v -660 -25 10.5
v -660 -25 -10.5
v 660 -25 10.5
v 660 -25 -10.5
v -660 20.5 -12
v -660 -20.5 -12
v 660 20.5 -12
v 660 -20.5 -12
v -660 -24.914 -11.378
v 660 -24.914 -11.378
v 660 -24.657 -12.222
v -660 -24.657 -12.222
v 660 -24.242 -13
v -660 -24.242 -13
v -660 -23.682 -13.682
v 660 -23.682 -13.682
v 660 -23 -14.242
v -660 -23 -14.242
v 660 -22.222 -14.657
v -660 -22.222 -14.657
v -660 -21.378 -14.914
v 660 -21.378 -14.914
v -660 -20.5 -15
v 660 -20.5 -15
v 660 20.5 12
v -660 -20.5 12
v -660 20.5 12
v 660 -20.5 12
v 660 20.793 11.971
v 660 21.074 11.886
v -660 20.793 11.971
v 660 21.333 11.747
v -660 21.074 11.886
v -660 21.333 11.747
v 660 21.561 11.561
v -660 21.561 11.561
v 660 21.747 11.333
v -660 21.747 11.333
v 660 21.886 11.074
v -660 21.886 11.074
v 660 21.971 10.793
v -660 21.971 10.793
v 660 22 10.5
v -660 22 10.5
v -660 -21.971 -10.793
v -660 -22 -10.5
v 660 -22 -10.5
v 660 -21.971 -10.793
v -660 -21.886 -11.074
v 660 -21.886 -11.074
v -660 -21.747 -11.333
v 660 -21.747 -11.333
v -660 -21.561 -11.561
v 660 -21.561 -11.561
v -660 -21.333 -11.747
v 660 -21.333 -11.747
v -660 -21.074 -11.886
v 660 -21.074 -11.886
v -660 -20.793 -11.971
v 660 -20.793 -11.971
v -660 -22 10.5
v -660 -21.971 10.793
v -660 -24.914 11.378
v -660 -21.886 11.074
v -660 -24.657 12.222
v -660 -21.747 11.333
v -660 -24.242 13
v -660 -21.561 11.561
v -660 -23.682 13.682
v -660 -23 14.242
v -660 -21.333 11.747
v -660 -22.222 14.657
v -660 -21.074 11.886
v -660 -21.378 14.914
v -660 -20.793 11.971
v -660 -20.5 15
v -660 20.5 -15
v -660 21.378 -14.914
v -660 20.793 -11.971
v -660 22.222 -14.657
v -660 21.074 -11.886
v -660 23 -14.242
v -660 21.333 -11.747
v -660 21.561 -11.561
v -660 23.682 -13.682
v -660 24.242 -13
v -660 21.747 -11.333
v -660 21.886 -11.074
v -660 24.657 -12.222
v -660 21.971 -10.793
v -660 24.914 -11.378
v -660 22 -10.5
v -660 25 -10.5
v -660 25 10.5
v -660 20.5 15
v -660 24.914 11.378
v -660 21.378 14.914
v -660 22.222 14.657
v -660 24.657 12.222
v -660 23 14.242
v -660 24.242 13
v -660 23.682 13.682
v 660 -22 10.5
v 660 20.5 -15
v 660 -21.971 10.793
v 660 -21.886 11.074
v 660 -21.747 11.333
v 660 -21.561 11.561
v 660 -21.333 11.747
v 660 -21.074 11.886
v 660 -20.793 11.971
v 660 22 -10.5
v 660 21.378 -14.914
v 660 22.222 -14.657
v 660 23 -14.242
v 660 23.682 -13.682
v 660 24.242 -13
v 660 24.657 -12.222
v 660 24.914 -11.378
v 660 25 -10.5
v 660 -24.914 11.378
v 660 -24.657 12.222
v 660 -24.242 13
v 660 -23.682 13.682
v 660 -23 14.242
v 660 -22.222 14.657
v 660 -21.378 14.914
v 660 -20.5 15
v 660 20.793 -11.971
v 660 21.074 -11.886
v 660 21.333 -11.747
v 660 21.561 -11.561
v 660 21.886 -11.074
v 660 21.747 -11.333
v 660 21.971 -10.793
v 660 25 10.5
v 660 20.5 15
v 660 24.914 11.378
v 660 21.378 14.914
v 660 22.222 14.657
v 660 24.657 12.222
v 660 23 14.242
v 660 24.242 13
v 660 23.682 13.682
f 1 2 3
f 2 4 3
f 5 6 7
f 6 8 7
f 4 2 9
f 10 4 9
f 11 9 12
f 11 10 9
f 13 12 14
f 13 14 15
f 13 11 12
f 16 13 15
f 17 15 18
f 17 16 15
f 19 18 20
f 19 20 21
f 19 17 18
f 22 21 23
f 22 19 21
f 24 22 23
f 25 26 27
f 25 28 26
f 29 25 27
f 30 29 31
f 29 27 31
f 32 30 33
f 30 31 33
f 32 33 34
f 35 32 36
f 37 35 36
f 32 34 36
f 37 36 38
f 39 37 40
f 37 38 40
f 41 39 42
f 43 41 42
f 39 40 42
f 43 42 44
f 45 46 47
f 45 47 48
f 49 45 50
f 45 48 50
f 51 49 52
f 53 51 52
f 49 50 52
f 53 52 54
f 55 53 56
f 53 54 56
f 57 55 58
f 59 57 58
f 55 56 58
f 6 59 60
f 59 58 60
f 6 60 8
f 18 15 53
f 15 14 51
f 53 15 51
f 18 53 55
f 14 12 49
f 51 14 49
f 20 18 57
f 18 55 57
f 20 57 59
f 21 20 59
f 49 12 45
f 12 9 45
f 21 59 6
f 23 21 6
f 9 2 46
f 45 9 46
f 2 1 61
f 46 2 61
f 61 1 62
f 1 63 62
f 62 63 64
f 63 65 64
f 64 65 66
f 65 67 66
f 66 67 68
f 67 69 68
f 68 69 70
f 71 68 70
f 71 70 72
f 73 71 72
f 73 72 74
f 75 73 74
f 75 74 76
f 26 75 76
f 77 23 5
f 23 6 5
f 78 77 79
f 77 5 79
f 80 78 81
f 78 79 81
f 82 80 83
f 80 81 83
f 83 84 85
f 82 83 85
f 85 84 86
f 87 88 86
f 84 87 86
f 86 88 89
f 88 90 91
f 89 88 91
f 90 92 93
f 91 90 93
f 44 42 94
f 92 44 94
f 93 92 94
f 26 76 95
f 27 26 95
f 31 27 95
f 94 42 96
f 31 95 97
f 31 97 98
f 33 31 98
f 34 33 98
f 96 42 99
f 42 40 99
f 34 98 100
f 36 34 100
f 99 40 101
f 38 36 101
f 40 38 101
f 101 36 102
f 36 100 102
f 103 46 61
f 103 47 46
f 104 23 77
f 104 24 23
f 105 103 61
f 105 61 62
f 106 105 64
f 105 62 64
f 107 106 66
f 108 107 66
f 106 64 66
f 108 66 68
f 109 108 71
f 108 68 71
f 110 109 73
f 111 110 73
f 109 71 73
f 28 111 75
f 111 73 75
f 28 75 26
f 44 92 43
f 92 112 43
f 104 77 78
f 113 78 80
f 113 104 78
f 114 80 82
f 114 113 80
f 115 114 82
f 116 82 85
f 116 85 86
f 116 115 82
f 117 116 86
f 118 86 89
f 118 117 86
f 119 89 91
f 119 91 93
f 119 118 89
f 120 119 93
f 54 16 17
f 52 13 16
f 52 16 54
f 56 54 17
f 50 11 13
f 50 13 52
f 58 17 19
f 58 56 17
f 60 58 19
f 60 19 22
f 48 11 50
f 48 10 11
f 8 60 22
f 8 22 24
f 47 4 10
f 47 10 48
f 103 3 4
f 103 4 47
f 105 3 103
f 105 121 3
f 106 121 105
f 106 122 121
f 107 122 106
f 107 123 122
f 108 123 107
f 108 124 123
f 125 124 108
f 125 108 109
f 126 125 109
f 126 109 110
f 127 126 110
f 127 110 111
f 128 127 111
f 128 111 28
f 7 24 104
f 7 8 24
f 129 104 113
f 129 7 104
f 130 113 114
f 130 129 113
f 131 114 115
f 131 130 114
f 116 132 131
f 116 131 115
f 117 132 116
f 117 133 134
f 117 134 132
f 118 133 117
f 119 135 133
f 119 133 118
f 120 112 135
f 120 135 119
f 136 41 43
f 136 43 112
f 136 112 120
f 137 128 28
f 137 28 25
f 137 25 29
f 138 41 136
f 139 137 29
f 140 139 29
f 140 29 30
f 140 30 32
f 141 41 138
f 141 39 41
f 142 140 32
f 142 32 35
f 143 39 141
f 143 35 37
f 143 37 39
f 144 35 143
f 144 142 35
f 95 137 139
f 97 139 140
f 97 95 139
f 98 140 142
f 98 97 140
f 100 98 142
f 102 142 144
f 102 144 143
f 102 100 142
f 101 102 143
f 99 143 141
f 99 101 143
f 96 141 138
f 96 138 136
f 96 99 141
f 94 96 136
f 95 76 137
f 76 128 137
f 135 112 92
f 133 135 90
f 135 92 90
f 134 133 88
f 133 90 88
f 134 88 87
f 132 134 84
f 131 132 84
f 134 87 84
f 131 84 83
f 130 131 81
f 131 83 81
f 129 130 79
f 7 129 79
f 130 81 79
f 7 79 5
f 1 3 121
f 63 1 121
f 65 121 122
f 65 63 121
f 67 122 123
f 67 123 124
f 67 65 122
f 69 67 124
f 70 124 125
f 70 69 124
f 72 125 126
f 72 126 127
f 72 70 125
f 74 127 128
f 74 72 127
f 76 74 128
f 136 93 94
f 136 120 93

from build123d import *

# Parameters (mm, degrees)
F0_W     = 50
F0_H     = 30
F0_W_2   = 44
F0_H_2   = 24
F1_DEPTH = 660
F2_R     = 1.5
F3_R     = 4.5


with BuildPart() as f1:
    # F0 (on Right) → F1 (new body, symmetric)
    with BuildSketch(Plane.YZ):
        Rectangle(F0_W, F0_H)
        Rectangle(F0_W_2, F0_H_2, mode=Mode.SUBTRACT)
    extrude(amount=F1_DEPTH, both=True)

    # F2
    f2_edges = [f1.edges().sort_by_distance(p)[0] for p in [
        (0, -22, -12),
        (0, -22, 12),
        (0, 22, -12),
        (0, 22, 12),
    ]]
    fillet(f2_edges, radius=F2_R)

    # F3
    f3_edges = [f1.edges().sort_by_distance(p)[0] for p in [
        (0, -25, 15),
        (0, -25, -15),
        (0, 25, -15),
        (0, 25, 15),
    ]]
    fillet(f3_edges, radius=F3_R)


solid = f1.part
